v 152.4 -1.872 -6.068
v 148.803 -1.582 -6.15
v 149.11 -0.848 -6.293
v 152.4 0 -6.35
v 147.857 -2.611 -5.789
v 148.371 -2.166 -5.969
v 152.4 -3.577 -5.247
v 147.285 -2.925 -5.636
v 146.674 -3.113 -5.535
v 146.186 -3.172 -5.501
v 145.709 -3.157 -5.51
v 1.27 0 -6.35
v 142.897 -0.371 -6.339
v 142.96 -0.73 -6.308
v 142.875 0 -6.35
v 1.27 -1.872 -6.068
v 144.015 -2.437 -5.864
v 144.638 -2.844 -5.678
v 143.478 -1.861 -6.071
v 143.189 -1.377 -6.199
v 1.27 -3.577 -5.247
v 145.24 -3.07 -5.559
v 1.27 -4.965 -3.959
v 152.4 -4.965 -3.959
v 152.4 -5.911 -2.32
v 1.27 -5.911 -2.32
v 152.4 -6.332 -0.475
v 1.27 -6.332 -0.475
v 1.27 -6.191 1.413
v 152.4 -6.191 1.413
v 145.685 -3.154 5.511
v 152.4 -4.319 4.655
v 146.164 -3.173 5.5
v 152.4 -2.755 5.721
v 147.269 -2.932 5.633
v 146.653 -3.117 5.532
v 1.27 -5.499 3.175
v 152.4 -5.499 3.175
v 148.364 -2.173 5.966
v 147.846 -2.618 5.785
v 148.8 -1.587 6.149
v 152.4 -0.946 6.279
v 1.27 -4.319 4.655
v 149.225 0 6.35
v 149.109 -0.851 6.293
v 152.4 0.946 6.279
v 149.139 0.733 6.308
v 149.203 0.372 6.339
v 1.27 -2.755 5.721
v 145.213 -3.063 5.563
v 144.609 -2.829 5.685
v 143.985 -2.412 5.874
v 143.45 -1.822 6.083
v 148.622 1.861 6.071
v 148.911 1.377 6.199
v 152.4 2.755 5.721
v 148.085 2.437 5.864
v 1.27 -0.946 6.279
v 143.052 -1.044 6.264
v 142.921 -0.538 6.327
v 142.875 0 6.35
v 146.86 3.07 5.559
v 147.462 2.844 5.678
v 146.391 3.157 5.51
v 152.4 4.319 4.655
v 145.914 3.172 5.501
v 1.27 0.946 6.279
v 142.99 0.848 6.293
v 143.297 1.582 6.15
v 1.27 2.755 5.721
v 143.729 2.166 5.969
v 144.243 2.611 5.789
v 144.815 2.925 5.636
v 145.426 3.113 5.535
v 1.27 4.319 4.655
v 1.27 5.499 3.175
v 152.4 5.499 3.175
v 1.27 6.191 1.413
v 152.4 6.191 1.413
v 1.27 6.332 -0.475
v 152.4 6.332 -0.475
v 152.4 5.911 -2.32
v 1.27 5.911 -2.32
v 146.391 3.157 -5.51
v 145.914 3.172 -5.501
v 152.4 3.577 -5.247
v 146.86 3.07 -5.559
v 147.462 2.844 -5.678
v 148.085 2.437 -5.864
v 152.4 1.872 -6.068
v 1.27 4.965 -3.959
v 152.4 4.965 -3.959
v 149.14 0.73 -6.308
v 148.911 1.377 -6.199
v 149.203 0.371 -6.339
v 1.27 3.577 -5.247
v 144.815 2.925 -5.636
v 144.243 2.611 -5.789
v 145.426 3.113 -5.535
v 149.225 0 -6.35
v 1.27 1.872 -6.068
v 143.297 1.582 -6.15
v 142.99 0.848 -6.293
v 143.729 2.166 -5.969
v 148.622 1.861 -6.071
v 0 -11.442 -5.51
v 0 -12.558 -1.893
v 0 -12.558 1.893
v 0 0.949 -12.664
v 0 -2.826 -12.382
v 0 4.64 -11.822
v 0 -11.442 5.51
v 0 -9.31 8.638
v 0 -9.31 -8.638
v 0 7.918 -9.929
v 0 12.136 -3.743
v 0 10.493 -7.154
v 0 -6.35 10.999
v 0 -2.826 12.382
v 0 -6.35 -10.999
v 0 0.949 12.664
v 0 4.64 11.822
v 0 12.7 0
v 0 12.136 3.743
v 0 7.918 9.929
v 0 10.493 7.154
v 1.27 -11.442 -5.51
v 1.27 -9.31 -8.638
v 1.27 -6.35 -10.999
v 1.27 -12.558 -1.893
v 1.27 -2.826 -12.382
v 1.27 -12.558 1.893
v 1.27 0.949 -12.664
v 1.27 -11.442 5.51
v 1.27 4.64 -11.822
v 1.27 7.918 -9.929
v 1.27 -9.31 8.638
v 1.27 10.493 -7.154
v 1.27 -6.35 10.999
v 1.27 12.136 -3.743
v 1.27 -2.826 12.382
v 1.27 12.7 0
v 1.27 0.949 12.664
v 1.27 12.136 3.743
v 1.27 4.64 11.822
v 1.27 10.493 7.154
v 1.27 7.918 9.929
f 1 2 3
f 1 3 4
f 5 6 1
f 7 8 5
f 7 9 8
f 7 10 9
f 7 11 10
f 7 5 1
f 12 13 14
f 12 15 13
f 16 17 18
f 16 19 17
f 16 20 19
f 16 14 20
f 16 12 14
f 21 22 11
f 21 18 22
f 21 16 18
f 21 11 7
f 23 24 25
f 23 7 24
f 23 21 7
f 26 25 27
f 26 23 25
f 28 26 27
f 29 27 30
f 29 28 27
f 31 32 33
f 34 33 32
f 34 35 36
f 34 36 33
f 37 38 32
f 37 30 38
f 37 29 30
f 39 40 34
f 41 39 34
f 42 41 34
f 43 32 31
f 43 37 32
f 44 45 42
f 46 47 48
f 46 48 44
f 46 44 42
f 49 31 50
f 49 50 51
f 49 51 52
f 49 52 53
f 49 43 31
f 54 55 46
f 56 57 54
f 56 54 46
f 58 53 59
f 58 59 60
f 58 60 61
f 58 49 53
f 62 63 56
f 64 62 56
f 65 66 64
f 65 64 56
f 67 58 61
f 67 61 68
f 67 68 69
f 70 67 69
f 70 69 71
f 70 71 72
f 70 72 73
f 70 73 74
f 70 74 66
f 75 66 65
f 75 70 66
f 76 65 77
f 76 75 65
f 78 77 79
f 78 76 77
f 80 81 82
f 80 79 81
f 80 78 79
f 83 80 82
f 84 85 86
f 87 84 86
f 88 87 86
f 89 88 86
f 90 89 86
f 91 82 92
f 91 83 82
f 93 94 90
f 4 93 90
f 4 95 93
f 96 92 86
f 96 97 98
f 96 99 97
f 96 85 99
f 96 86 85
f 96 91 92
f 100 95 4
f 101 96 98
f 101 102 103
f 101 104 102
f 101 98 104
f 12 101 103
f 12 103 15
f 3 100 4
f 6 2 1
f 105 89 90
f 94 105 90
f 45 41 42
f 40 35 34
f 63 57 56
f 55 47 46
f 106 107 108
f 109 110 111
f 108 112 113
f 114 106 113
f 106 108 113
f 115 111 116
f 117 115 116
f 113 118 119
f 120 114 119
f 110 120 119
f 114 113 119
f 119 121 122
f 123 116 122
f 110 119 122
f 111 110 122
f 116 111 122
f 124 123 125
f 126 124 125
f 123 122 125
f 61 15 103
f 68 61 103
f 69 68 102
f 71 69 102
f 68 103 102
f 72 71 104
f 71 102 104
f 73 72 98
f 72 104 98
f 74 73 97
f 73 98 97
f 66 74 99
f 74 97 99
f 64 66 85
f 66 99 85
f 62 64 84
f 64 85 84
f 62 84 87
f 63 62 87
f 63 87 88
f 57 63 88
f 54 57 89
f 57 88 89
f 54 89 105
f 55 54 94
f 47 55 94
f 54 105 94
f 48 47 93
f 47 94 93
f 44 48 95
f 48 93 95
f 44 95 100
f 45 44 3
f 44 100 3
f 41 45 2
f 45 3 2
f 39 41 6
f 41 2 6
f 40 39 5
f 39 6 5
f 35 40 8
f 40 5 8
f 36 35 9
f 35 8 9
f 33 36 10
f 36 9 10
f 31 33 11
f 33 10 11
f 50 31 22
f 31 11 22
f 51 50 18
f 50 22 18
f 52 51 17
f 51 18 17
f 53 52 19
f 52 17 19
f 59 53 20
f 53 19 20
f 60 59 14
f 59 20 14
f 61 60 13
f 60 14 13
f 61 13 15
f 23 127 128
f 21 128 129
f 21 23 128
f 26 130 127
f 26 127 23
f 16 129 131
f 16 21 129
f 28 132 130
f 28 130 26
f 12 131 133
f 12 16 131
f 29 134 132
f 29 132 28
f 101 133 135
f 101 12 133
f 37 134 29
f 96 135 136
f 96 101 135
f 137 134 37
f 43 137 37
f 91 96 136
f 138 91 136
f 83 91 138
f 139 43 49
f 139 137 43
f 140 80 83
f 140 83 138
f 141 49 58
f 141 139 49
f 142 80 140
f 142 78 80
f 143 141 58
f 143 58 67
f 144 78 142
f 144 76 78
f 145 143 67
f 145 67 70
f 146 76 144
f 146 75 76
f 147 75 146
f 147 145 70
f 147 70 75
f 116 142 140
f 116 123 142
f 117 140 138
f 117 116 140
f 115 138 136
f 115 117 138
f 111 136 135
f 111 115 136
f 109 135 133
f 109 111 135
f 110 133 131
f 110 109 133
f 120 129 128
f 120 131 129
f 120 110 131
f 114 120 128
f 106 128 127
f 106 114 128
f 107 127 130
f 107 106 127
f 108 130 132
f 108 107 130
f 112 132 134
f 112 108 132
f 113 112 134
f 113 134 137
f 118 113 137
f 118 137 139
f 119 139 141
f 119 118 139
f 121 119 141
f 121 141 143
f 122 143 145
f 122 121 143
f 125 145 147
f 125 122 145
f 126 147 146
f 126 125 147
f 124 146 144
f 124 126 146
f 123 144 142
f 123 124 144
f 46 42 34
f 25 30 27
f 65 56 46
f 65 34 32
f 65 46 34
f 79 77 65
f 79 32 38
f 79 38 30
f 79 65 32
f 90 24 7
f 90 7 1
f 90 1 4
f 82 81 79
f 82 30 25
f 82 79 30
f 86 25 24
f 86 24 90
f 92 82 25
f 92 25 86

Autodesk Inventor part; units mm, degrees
ref_plane "YZ Plane" through (0, 0, 0) normal (1, 0, 0) x (0, 1, 0)
ref_plane "XZ Plane" through (0, 0, 0) normal (0, 1, 0) x (-1, 0, 0)
sketch "Sketch1" plane through (0, 0, 0) normal (1, 0, 0) x (0, 1, 0)
  circle A0 centre (0, 0) radius 12.7
  dimension "d0" = 25.4
extrude "Extrusion1" add sketch "Sketch1" along normal blind 1.27
sketch "Sketch2" plane through (1.27, 0, 0) normal (1, 0, 0) x (0, 0, -1)
  circle A0 centre (0, 0) radius 6.35
  dimension "d3" = 12.7
extrude "Extrusion2" add sketch "Sketch2" along normal blind 151.13
sketch "Sketch3" plane through (152.4, 0, 0) normal (1, 0, 0) x (0, 0, -1)
  circle A0 centre (0, 0) radius 6.35 projected
  circle A1 centre (0, 0) radius 6.35 projected
  point P0 (-6.35, 0)
  point P1 (6.35, 0)
ref_plane "Work Plane3" through (152.4, 0, 0) normal (0, 0, -1) x (-1, 0, 0)
ref_plane "Work Plane1" through (152.4, 0, 6.35) normal (0, 0, 1) x (1, 0, 0)
ref_plane "Work Plane2" through (152.4, 0, -6.35) normal (0, 0, -1) x (-1, 0, 0)
sketch "Sketch4" plane through (152.4, 0, -6.35) normal (0, 0, -1) x (-1, 0, 0)
  circle A0 centre (6.35, 0) radius 3.175
  line L0 (0, 6.35) -> (0, -6.35) projected
  point P0 (152.4, 0)
  dimension "d6" = 6.35
  dimension "d7" = 6.35
extrude "Extrusion3" cut sketch "Sketch4" against normal blind 12.7
properties part number "Intake Basic Piston - Inner"
